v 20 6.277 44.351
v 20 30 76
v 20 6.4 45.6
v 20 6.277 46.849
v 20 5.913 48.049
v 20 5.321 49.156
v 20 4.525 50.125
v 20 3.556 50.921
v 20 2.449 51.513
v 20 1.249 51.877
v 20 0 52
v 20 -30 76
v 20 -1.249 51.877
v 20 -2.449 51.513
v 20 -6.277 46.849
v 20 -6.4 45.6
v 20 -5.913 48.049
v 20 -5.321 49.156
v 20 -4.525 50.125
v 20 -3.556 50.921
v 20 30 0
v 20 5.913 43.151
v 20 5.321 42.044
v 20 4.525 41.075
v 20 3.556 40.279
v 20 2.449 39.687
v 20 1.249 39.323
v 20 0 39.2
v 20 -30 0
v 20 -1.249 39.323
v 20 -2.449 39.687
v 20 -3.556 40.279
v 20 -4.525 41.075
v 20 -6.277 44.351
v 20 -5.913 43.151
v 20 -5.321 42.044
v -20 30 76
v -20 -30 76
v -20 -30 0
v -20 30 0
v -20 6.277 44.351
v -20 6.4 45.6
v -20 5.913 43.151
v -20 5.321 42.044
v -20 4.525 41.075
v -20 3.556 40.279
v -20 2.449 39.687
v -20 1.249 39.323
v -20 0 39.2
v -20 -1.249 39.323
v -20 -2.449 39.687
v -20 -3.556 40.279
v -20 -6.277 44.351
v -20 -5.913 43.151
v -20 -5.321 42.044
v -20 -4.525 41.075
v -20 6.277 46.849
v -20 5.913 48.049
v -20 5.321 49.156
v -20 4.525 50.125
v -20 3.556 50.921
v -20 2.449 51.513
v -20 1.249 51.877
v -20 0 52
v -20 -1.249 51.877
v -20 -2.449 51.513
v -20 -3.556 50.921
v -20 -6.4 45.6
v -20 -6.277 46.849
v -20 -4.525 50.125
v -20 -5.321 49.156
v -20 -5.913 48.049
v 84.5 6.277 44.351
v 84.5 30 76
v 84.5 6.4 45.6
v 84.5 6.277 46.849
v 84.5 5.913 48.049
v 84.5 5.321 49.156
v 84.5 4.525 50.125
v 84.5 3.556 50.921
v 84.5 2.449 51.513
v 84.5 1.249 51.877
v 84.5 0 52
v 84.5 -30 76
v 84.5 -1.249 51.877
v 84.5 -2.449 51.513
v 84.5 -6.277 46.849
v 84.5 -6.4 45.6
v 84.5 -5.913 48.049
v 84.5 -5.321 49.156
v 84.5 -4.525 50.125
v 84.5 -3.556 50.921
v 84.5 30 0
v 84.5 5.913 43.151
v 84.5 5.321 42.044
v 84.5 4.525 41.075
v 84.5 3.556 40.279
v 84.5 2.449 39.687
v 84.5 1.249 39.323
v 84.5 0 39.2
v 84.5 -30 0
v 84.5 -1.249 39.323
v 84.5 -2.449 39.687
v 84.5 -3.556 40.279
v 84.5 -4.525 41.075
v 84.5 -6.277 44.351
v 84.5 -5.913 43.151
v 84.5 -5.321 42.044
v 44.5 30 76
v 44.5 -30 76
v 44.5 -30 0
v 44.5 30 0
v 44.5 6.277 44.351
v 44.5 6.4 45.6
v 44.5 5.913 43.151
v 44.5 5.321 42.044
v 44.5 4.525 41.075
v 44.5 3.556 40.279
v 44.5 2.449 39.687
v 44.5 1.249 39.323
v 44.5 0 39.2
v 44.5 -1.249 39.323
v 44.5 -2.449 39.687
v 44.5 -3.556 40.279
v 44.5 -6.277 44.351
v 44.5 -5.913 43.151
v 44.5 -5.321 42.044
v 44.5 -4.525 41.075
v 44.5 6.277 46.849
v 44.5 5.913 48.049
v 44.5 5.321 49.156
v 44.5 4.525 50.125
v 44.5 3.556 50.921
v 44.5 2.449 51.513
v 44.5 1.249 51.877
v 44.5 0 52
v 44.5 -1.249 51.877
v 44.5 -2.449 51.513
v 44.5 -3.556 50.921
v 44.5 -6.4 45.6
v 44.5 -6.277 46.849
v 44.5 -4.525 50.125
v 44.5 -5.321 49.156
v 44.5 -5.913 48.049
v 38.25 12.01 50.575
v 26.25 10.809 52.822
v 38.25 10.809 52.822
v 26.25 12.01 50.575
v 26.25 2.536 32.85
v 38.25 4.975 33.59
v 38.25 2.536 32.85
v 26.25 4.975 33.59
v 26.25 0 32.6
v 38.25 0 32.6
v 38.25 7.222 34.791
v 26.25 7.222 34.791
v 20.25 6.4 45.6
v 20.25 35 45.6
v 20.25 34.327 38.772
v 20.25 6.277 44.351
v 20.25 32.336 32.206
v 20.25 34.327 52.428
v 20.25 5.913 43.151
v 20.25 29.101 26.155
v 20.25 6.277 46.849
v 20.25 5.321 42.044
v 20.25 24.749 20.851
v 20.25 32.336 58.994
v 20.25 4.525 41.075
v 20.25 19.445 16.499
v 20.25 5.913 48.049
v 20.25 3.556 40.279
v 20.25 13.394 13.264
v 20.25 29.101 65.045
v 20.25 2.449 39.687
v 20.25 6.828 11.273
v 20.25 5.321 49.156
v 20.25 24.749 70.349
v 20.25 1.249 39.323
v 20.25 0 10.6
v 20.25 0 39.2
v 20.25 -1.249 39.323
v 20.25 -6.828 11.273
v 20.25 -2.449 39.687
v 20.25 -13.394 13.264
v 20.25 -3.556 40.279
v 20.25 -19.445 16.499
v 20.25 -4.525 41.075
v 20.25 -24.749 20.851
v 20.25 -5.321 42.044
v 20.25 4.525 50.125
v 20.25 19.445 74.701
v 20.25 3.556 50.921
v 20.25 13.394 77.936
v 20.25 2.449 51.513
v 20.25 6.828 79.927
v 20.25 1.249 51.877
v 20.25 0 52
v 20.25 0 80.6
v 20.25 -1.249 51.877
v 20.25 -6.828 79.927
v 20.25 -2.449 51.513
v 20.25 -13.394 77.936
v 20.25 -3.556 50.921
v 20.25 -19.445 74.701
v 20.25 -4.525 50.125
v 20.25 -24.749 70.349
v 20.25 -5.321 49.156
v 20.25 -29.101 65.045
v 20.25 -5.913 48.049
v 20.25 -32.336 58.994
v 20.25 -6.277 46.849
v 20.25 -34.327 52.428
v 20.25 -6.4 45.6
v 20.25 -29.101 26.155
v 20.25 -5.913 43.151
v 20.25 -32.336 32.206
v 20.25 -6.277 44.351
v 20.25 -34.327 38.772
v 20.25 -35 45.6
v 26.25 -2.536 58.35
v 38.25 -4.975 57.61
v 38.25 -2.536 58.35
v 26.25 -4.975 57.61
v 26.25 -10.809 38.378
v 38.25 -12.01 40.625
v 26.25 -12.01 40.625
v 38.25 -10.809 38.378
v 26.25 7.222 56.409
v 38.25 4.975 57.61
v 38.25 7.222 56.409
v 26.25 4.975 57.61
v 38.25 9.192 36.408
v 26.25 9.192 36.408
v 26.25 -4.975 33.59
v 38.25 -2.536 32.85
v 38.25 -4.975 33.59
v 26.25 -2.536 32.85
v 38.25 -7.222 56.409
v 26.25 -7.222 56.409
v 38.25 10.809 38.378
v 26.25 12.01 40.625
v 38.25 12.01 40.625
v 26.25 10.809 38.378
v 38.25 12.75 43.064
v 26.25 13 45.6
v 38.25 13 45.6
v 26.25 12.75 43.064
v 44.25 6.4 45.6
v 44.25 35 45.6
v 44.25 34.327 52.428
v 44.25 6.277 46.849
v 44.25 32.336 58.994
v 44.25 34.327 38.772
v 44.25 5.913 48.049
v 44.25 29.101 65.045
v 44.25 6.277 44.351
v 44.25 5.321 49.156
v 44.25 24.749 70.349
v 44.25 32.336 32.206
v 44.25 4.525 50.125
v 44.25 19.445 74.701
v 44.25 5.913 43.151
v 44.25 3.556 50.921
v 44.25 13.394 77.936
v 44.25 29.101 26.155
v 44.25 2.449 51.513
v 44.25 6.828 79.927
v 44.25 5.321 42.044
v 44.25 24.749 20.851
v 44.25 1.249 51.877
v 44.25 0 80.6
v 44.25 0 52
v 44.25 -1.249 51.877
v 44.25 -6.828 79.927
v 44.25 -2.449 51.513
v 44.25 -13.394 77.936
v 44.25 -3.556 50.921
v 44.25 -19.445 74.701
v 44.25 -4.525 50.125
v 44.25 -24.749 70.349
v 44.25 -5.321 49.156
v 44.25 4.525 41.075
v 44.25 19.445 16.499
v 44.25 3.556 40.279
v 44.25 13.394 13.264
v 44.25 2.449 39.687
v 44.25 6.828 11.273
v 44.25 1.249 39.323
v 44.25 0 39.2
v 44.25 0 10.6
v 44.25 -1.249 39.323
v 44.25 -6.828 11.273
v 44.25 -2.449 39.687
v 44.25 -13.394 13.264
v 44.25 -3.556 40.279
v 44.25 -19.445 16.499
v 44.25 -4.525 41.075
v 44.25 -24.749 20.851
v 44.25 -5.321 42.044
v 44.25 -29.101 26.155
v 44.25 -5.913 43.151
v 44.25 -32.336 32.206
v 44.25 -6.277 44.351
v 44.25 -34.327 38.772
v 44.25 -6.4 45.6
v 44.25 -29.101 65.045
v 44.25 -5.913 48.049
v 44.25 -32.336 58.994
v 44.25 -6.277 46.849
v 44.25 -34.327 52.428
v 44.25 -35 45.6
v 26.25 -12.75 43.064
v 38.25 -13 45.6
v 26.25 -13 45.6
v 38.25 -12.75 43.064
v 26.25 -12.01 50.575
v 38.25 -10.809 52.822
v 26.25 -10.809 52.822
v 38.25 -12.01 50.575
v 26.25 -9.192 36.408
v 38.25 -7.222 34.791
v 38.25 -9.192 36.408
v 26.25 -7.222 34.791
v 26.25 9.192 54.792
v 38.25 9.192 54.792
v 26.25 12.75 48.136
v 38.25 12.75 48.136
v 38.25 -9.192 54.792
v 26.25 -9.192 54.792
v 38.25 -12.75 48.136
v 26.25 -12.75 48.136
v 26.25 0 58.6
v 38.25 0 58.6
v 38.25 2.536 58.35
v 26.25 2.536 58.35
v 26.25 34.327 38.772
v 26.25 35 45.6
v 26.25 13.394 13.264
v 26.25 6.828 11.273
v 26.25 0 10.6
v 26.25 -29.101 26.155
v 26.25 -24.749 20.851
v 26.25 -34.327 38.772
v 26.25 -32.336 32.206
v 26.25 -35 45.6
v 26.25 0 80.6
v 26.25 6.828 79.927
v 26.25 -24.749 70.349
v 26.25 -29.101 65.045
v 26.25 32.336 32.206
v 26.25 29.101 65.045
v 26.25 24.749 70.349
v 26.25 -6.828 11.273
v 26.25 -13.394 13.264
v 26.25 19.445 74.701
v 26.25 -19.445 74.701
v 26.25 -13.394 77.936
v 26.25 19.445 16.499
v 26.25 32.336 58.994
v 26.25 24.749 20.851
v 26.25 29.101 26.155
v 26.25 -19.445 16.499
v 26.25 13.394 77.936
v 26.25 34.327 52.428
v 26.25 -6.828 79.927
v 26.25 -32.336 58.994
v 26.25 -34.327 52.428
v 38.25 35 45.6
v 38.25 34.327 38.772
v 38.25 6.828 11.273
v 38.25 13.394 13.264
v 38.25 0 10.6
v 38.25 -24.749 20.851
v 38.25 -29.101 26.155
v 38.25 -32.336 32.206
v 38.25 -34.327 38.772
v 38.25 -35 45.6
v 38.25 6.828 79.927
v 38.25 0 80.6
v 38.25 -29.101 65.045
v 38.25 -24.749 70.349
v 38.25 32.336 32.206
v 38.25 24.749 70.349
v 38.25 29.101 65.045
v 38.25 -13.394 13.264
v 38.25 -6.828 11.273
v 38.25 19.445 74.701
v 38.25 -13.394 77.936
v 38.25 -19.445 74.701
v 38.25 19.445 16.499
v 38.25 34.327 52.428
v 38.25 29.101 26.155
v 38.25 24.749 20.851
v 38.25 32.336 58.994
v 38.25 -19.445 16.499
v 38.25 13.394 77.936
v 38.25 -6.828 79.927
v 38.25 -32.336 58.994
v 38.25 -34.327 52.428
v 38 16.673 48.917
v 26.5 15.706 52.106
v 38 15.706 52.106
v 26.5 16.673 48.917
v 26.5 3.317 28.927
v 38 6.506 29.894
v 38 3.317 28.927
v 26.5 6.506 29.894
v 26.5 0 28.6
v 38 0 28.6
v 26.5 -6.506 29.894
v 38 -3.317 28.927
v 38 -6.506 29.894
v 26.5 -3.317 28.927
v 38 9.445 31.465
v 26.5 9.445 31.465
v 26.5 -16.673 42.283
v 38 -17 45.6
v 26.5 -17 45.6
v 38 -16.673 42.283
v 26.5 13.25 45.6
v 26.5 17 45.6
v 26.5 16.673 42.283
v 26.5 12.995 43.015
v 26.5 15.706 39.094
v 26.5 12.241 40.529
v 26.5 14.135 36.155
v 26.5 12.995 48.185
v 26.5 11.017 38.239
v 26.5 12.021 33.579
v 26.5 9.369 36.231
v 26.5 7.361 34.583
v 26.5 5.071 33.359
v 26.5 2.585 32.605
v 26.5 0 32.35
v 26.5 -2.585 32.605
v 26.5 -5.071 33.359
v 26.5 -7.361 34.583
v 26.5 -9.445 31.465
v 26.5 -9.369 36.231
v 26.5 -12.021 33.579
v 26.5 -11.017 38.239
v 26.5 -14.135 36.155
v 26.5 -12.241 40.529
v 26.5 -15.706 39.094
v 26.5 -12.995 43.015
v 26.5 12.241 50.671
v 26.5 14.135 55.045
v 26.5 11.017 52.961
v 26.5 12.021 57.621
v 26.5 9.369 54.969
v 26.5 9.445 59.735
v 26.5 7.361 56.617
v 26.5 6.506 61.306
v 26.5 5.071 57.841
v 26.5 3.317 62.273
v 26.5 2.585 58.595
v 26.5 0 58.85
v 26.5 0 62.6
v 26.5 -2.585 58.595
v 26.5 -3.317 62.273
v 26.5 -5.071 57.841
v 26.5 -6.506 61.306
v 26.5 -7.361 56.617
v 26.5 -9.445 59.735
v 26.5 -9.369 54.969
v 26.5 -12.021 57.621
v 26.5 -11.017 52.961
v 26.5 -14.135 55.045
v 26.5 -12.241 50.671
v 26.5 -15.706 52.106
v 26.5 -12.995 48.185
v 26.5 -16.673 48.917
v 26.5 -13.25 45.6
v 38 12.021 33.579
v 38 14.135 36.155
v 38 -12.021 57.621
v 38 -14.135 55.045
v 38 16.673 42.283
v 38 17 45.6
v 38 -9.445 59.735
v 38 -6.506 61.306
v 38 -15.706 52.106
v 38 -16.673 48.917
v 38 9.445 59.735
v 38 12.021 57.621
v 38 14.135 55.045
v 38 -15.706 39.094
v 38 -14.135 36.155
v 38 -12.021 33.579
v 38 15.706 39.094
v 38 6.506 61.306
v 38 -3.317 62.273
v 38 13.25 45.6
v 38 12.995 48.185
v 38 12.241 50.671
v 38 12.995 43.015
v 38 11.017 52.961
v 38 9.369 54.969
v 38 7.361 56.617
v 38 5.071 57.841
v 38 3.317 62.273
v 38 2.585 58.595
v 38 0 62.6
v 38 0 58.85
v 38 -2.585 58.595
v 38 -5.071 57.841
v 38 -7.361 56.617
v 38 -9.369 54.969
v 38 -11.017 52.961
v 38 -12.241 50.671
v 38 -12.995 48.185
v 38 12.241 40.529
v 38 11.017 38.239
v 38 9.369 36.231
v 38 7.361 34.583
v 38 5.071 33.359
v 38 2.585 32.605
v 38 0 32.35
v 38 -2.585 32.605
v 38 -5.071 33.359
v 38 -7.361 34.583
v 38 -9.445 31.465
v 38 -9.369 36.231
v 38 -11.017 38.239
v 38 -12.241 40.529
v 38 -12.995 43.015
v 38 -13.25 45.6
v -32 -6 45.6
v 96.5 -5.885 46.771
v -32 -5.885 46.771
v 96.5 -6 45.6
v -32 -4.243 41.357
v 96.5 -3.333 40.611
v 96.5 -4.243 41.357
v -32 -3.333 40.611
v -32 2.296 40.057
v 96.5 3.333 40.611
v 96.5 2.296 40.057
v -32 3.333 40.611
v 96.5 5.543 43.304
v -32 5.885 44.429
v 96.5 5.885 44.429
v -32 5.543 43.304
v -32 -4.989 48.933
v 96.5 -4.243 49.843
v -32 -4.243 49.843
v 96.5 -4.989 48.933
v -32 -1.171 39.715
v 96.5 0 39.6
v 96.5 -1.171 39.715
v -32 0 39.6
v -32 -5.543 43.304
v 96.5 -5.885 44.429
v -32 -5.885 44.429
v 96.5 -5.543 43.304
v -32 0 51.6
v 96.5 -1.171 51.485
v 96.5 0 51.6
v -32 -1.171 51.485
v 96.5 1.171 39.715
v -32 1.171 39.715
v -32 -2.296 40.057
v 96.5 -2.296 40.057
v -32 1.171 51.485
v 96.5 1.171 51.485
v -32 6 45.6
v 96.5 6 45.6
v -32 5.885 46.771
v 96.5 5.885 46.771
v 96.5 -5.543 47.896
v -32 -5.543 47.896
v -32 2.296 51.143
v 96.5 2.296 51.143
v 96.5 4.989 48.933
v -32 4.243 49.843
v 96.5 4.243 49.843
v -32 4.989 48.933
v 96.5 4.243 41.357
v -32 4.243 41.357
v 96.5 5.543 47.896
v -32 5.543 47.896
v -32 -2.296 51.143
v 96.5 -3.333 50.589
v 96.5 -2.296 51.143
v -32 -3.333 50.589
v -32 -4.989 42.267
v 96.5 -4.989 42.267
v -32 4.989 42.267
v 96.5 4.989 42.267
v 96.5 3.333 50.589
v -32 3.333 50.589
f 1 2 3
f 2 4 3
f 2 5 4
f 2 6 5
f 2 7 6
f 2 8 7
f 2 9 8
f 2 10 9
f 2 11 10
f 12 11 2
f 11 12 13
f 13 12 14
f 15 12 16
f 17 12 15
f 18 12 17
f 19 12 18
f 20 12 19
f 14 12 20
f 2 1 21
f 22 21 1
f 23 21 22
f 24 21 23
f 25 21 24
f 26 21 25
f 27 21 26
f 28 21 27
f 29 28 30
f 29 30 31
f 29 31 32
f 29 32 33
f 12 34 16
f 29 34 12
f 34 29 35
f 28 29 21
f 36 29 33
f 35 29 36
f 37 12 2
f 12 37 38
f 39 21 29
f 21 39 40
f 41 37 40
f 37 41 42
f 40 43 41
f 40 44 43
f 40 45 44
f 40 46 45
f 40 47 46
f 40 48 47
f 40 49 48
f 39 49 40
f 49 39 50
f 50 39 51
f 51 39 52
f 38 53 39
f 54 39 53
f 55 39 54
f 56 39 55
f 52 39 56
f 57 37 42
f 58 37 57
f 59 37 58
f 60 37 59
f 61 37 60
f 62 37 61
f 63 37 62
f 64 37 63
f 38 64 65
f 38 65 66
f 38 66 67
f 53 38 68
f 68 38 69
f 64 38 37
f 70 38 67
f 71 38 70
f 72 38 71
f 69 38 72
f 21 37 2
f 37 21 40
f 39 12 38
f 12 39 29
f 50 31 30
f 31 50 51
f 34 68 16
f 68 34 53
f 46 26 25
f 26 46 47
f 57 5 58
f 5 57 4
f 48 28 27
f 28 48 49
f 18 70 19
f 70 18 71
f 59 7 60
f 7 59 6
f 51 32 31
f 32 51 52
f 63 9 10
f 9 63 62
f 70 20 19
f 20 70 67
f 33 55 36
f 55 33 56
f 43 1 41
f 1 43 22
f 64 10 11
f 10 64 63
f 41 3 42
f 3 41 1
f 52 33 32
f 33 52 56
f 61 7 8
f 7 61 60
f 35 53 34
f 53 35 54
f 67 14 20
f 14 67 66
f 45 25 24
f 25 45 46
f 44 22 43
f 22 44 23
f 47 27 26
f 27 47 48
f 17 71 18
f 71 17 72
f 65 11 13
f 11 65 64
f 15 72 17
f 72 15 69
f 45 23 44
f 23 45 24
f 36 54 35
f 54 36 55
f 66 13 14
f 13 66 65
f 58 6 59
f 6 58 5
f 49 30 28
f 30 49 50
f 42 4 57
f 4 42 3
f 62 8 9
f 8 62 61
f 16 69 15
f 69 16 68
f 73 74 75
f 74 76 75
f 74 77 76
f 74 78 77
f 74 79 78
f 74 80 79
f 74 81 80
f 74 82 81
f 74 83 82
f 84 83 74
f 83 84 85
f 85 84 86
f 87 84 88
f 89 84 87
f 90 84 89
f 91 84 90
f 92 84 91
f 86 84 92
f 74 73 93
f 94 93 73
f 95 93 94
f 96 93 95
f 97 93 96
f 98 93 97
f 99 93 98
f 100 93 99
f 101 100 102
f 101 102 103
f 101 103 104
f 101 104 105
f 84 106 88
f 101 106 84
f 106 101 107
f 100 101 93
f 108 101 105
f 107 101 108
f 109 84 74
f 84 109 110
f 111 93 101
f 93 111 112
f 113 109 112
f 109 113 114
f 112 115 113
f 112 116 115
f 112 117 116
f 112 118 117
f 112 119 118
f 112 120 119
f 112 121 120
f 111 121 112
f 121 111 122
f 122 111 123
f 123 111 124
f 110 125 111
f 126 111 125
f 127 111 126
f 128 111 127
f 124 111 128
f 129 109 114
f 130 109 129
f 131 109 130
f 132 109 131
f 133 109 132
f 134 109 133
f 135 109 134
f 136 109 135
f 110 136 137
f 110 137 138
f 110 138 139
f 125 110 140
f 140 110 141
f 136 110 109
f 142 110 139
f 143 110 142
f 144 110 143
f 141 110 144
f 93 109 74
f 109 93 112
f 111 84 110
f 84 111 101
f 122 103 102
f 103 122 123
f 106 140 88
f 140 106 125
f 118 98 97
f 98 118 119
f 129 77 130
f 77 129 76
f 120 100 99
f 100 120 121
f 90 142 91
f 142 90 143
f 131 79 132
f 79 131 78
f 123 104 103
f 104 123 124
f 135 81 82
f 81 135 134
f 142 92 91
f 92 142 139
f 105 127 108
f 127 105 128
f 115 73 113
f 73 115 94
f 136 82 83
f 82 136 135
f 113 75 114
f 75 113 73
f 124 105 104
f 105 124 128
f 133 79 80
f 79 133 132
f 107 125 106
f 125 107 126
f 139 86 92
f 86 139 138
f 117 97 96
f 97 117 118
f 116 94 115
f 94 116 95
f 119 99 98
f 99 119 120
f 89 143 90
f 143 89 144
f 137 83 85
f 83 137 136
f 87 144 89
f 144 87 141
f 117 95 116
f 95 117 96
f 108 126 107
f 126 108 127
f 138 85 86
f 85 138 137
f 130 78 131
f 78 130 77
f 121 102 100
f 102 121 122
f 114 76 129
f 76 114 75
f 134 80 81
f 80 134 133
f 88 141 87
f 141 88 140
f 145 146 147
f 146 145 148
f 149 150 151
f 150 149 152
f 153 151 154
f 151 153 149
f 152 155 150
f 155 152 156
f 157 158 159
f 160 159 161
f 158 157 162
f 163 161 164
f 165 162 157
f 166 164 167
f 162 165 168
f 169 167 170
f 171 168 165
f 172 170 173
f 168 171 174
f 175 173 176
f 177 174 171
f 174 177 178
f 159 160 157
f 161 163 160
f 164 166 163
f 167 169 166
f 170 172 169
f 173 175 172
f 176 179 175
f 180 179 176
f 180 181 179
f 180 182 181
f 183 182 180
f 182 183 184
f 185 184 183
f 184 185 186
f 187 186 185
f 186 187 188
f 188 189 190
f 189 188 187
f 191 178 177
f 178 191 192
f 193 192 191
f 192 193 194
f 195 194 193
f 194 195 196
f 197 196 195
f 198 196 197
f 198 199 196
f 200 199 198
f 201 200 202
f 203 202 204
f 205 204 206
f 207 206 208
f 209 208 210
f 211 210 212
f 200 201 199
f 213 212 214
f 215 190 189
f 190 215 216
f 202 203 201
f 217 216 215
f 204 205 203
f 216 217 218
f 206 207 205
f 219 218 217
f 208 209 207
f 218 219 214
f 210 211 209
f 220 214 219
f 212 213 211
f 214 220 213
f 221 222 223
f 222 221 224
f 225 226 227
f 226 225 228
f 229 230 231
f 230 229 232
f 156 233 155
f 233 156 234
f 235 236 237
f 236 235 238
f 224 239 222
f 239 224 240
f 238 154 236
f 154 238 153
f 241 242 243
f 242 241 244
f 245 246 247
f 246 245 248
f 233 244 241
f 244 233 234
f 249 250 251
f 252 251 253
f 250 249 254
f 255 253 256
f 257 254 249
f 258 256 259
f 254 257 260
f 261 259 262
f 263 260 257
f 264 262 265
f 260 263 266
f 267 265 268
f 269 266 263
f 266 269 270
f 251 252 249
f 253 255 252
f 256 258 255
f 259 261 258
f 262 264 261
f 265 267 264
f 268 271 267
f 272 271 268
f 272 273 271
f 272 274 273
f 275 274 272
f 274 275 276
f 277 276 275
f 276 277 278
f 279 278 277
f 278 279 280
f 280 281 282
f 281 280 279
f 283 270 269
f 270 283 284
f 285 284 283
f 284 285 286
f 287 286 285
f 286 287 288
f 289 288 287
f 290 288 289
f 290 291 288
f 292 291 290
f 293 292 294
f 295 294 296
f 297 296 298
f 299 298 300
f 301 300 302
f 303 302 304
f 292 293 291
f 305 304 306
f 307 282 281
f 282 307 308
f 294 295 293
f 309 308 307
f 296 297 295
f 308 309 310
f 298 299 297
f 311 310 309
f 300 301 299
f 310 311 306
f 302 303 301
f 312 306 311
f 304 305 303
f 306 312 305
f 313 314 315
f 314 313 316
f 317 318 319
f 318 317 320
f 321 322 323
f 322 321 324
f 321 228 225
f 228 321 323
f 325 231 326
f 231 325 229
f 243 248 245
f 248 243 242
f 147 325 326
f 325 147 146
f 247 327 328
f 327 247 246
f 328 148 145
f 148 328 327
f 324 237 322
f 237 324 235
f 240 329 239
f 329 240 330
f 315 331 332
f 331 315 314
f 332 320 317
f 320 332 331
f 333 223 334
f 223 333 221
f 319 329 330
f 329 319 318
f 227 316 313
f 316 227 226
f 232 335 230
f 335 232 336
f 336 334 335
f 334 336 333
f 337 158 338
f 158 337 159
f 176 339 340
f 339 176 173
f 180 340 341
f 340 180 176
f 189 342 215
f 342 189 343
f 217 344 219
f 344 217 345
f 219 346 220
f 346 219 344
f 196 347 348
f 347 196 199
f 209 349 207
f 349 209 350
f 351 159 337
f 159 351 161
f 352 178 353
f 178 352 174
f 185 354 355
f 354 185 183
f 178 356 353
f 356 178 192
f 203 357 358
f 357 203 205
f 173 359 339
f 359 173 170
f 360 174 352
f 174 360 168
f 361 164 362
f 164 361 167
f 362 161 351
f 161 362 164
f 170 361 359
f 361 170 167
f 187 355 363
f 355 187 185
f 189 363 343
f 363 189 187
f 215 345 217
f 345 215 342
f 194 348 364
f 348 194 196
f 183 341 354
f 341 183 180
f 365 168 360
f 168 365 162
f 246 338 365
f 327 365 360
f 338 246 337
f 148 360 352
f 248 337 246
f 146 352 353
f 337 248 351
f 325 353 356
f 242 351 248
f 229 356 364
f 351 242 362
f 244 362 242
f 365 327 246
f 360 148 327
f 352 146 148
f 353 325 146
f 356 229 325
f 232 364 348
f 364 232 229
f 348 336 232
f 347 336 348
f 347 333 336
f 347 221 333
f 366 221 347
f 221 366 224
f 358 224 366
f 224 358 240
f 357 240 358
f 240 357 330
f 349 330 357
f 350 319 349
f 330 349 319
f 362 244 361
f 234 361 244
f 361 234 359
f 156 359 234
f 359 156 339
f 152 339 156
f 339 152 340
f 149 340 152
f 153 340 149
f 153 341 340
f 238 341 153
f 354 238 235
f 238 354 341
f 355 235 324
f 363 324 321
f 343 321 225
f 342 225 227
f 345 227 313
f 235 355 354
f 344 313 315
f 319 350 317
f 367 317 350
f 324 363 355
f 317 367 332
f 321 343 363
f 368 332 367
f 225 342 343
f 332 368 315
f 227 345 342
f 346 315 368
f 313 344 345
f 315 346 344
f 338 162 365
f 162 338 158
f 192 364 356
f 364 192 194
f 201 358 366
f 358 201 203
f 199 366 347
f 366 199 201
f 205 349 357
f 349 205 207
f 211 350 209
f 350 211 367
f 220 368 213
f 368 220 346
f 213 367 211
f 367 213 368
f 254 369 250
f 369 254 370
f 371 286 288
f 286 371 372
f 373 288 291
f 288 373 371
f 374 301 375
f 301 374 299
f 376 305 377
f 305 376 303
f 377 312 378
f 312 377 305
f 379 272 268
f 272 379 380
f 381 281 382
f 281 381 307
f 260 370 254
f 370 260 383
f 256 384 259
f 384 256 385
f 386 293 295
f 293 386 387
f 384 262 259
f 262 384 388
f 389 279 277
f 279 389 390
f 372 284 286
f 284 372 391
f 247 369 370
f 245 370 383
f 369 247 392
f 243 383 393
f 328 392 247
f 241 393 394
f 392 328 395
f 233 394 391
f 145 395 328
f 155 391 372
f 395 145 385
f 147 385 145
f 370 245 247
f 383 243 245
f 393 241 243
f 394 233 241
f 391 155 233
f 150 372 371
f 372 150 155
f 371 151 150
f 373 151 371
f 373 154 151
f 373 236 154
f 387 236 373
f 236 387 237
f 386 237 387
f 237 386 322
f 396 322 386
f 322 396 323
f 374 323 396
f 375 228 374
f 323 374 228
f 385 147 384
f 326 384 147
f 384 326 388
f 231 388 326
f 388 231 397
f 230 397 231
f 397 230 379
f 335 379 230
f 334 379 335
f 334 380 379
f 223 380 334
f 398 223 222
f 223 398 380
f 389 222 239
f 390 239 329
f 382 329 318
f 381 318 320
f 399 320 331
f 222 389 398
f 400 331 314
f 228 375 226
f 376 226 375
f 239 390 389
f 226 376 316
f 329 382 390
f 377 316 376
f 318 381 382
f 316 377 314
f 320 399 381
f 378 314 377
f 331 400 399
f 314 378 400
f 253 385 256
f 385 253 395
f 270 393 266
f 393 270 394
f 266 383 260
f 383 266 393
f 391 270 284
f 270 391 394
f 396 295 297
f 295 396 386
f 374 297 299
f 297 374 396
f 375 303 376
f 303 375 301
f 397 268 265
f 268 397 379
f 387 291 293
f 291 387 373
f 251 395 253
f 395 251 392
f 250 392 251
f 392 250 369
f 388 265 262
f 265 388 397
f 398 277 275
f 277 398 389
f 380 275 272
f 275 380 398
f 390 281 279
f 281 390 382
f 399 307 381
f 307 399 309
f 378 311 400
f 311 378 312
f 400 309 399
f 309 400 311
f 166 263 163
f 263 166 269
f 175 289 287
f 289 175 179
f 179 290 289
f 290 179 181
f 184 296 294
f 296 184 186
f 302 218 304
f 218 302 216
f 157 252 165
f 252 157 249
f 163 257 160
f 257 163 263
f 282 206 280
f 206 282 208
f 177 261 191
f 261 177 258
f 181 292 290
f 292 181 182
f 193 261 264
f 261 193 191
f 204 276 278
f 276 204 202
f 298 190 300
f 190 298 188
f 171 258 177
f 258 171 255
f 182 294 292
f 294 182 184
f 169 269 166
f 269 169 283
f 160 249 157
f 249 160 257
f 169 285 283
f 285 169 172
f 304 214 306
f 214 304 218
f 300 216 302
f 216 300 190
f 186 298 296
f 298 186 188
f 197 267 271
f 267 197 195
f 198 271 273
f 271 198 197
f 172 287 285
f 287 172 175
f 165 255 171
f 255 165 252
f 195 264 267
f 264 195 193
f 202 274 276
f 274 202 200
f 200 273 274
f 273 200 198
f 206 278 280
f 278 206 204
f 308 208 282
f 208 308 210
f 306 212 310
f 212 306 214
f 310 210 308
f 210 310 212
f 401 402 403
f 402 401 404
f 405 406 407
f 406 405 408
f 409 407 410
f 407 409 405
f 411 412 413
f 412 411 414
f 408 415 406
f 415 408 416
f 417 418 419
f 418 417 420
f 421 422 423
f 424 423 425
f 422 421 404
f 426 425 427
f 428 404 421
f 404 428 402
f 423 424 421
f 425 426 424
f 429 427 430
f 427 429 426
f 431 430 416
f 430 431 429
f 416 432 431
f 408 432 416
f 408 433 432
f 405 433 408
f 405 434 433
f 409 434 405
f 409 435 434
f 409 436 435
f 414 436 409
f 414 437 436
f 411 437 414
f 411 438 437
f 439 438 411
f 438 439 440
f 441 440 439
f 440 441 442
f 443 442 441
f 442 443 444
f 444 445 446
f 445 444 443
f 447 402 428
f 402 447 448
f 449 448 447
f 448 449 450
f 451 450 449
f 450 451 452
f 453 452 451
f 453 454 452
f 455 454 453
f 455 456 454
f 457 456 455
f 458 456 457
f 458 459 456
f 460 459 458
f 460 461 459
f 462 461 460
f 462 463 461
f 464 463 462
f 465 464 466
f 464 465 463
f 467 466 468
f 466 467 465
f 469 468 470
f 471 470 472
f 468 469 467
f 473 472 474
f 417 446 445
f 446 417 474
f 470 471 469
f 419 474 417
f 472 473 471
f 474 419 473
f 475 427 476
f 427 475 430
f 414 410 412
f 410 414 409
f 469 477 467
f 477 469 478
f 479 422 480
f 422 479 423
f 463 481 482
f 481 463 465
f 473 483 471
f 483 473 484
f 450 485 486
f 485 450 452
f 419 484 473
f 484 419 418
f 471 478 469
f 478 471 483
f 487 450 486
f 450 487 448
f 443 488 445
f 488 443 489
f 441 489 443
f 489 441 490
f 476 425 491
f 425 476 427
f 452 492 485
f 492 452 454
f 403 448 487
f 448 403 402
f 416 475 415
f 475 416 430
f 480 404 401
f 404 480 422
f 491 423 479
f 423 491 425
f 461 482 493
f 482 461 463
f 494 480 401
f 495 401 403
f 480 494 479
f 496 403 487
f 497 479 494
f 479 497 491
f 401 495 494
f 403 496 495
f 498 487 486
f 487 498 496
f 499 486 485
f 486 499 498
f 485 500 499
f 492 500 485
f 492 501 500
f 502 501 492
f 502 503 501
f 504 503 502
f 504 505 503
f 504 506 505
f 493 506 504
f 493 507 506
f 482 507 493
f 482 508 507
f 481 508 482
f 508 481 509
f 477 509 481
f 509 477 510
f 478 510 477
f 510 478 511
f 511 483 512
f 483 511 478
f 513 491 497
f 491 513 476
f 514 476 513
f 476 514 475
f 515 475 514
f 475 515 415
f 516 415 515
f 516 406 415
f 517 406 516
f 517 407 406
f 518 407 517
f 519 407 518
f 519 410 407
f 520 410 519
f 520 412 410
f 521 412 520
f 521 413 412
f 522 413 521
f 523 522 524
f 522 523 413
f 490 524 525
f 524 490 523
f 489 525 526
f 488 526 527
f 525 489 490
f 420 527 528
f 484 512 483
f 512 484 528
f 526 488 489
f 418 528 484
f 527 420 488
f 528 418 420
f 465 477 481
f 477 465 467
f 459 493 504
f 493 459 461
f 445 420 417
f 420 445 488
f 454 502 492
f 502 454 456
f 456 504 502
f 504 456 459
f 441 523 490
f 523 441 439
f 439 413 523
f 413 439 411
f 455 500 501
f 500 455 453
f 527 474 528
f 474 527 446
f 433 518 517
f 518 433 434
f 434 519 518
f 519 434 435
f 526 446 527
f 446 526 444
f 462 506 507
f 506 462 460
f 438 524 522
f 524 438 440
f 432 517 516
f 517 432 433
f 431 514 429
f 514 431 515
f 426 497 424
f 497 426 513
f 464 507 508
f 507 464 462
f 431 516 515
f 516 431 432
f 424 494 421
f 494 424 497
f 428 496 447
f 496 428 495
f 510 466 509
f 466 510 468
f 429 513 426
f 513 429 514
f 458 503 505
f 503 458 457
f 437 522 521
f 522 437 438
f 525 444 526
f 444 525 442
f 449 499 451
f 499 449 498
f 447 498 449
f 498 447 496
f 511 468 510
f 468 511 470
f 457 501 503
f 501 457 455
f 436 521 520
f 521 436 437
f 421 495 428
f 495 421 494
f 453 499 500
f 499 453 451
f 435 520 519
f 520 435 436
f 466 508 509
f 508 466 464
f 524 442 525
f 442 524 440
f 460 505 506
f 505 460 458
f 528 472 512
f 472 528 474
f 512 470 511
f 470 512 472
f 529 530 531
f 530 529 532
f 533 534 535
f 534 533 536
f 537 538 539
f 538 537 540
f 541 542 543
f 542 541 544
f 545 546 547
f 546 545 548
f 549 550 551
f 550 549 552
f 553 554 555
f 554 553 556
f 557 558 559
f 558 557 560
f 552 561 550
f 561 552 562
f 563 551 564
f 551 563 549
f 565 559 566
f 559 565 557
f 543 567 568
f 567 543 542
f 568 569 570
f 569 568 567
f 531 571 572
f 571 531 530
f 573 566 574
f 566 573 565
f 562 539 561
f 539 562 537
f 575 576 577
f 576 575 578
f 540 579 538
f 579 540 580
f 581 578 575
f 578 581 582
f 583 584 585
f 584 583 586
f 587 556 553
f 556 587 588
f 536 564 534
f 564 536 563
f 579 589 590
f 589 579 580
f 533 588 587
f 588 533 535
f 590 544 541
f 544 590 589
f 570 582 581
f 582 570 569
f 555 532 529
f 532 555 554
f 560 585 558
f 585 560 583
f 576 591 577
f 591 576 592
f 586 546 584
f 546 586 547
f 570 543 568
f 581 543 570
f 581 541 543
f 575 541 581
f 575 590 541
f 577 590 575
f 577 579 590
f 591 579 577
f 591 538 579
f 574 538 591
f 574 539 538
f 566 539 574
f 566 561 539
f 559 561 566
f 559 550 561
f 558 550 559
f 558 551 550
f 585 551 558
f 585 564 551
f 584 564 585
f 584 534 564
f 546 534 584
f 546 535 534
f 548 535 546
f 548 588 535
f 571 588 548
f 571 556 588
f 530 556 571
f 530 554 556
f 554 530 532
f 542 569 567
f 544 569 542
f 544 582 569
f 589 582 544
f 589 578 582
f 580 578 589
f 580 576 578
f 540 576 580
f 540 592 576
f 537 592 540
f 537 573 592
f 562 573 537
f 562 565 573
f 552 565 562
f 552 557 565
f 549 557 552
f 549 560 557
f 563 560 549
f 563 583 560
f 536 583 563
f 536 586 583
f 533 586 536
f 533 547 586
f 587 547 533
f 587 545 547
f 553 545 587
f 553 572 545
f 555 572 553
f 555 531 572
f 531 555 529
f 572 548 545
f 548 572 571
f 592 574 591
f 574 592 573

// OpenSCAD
$fn = 32;

// ------------------------------------------------------------------------
// Pulley assembly: d70 pulley with a belt, shaft d12
// Every part is its own module, assembly() places them once.
// ------------------------------------------------------------------------

// --- part 1 ---
module support1() {
  difference() {
    translate([-20, -30, 0]) cube([40, 60, 76]);
    translate([0, 0, 45.6]) rotate([0, 90, 0]) cylinder(h = 42, d = 12.8, center = true);
  }
}

// --- part 2 ---
module support2() {
  difference() {
    translate([-20, -30, 0]) cube([40, 60, 76]);
    translate([0, 0, 45.6]) rotate([0, 90, 0]) cylinder(h = 42, d = 12.8, center = true);
  }
}

// --- part 3 ---
module shaft() {
  translate([0, 0, -64.25]) cylinder(h = 128.5, d = 12);
}

// --- part 4 ---
module pulley() {
  difference() {
    union() {
      cylinder(h = 24, d = 26);
      cylinder(h = 6, d = 70);
      translate([0, 0, 18]) cylinder(h = 6, d = 70);
    }
    translate([0, 0, -1]) cylinder(h = 26, d = 12.8);
  }
}

// --- part 5 ---
module belt() {
  difference() {
      translate([0, 0, 0]) cylinder(h = 11.5, d = 34);
      translate([0, 0, -1]) cylinder(h = 13.5, d = 26.5);
    }
}

// --- assembly ---
module assembly() {
  translate([0, 0, 0]) rotate([0, 0, 0]) support1();
  translate([64.5, 0, 0]) rotate([0, 0, 0]) support2();
  translate([32.25, 0, 45.6]) rotate([0, 90, 0]) shaft();
  translate([20.25, 0, 45.6]) rotate([0, 90, 0]) pulley();
  translate([26.5, 0, 45.6]) rotate([0, 90, 0]) belt();
}

assembly();
